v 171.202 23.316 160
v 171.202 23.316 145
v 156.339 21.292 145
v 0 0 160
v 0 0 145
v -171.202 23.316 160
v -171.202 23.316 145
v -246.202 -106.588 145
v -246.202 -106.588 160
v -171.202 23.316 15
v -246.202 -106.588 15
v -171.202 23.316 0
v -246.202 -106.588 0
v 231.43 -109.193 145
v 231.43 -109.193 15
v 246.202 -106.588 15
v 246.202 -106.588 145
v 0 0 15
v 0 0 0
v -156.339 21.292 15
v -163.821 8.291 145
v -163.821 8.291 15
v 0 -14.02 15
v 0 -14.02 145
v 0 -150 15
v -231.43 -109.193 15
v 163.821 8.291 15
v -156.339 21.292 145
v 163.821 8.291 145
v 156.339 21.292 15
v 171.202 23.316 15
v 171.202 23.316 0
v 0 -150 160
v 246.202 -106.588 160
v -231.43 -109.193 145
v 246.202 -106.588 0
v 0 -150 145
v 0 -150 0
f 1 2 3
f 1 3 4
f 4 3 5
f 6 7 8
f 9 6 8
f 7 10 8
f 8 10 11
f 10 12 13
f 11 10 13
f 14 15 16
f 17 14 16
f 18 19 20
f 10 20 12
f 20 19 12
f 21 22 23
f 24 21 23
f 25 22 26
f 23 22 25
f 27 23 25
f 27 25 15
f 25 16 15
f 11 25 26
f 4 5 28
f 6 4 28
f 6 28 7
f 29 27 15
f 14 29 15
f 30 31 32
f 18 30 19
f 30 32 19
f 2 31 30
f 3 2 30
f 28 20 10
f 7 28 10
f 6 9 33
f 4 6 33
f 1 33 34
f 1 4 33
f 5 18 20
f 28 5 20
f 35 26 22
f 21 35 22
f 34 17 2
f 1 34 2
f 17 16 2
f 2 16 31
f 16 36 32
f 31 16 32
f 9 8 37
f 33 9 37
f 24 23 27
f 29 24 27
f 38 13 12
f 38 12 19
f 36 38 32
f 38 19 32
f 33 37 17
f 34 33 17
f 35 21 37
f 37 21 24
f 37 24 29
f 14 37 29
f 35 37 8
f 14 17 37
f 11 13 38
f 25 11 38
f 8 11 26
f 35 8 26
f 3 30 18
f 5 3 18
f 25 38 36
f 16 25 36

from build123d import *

# Parameters (mm, degrees)
F1_DEPTH = 15
F3_DEPTH = 130
F5_DEPTH = 15


with BuildPart() as f1:
    # F0 (on Top) → F1 (new body)
    with BuildSketch(Plane.XY):
        Polygon((171.201938, 23.315855), (0, 0), (0, -150), (246.201938, -106.587956), align=None)
        Polygon((0, -150), (0, 0), (-171.201938, 23.315855), (-246.201938, -106.587956), align=None)
    extrude(amount=F1_DEPTH)

    # F2 (on face) → F3 (join)
    with BuildSketch(Plane.XY.offset(15)):
        Polygon((-171.201938, 23.315855), (-246.201938, -106.587956), (-231.429822, -109.192678), (-163.82086, 8.290785), (0, -14.019847), (163.82086, 8.290785), (231.429822, -109.192678), (246.201938, -106.587956), (171.201938, 23.315855), (156.339139, 21.291702), (0, 0), (-156.339139, 21.291702), align=None)
    extrude(amount=F3_DEPTH)

    # F4 (on face) → F5 (join)
    with BuildSketch(Plane.XY.offset(145)):
        Polygon((-171.201938, 23.315855), (-246.201938, -106.587956), (0, -150), (246.201938, -106.587956), (171.201938, 23.315855), (0, 0), align=None)
    extrude(amount=F5_DEPTH)


solid = f1.part
